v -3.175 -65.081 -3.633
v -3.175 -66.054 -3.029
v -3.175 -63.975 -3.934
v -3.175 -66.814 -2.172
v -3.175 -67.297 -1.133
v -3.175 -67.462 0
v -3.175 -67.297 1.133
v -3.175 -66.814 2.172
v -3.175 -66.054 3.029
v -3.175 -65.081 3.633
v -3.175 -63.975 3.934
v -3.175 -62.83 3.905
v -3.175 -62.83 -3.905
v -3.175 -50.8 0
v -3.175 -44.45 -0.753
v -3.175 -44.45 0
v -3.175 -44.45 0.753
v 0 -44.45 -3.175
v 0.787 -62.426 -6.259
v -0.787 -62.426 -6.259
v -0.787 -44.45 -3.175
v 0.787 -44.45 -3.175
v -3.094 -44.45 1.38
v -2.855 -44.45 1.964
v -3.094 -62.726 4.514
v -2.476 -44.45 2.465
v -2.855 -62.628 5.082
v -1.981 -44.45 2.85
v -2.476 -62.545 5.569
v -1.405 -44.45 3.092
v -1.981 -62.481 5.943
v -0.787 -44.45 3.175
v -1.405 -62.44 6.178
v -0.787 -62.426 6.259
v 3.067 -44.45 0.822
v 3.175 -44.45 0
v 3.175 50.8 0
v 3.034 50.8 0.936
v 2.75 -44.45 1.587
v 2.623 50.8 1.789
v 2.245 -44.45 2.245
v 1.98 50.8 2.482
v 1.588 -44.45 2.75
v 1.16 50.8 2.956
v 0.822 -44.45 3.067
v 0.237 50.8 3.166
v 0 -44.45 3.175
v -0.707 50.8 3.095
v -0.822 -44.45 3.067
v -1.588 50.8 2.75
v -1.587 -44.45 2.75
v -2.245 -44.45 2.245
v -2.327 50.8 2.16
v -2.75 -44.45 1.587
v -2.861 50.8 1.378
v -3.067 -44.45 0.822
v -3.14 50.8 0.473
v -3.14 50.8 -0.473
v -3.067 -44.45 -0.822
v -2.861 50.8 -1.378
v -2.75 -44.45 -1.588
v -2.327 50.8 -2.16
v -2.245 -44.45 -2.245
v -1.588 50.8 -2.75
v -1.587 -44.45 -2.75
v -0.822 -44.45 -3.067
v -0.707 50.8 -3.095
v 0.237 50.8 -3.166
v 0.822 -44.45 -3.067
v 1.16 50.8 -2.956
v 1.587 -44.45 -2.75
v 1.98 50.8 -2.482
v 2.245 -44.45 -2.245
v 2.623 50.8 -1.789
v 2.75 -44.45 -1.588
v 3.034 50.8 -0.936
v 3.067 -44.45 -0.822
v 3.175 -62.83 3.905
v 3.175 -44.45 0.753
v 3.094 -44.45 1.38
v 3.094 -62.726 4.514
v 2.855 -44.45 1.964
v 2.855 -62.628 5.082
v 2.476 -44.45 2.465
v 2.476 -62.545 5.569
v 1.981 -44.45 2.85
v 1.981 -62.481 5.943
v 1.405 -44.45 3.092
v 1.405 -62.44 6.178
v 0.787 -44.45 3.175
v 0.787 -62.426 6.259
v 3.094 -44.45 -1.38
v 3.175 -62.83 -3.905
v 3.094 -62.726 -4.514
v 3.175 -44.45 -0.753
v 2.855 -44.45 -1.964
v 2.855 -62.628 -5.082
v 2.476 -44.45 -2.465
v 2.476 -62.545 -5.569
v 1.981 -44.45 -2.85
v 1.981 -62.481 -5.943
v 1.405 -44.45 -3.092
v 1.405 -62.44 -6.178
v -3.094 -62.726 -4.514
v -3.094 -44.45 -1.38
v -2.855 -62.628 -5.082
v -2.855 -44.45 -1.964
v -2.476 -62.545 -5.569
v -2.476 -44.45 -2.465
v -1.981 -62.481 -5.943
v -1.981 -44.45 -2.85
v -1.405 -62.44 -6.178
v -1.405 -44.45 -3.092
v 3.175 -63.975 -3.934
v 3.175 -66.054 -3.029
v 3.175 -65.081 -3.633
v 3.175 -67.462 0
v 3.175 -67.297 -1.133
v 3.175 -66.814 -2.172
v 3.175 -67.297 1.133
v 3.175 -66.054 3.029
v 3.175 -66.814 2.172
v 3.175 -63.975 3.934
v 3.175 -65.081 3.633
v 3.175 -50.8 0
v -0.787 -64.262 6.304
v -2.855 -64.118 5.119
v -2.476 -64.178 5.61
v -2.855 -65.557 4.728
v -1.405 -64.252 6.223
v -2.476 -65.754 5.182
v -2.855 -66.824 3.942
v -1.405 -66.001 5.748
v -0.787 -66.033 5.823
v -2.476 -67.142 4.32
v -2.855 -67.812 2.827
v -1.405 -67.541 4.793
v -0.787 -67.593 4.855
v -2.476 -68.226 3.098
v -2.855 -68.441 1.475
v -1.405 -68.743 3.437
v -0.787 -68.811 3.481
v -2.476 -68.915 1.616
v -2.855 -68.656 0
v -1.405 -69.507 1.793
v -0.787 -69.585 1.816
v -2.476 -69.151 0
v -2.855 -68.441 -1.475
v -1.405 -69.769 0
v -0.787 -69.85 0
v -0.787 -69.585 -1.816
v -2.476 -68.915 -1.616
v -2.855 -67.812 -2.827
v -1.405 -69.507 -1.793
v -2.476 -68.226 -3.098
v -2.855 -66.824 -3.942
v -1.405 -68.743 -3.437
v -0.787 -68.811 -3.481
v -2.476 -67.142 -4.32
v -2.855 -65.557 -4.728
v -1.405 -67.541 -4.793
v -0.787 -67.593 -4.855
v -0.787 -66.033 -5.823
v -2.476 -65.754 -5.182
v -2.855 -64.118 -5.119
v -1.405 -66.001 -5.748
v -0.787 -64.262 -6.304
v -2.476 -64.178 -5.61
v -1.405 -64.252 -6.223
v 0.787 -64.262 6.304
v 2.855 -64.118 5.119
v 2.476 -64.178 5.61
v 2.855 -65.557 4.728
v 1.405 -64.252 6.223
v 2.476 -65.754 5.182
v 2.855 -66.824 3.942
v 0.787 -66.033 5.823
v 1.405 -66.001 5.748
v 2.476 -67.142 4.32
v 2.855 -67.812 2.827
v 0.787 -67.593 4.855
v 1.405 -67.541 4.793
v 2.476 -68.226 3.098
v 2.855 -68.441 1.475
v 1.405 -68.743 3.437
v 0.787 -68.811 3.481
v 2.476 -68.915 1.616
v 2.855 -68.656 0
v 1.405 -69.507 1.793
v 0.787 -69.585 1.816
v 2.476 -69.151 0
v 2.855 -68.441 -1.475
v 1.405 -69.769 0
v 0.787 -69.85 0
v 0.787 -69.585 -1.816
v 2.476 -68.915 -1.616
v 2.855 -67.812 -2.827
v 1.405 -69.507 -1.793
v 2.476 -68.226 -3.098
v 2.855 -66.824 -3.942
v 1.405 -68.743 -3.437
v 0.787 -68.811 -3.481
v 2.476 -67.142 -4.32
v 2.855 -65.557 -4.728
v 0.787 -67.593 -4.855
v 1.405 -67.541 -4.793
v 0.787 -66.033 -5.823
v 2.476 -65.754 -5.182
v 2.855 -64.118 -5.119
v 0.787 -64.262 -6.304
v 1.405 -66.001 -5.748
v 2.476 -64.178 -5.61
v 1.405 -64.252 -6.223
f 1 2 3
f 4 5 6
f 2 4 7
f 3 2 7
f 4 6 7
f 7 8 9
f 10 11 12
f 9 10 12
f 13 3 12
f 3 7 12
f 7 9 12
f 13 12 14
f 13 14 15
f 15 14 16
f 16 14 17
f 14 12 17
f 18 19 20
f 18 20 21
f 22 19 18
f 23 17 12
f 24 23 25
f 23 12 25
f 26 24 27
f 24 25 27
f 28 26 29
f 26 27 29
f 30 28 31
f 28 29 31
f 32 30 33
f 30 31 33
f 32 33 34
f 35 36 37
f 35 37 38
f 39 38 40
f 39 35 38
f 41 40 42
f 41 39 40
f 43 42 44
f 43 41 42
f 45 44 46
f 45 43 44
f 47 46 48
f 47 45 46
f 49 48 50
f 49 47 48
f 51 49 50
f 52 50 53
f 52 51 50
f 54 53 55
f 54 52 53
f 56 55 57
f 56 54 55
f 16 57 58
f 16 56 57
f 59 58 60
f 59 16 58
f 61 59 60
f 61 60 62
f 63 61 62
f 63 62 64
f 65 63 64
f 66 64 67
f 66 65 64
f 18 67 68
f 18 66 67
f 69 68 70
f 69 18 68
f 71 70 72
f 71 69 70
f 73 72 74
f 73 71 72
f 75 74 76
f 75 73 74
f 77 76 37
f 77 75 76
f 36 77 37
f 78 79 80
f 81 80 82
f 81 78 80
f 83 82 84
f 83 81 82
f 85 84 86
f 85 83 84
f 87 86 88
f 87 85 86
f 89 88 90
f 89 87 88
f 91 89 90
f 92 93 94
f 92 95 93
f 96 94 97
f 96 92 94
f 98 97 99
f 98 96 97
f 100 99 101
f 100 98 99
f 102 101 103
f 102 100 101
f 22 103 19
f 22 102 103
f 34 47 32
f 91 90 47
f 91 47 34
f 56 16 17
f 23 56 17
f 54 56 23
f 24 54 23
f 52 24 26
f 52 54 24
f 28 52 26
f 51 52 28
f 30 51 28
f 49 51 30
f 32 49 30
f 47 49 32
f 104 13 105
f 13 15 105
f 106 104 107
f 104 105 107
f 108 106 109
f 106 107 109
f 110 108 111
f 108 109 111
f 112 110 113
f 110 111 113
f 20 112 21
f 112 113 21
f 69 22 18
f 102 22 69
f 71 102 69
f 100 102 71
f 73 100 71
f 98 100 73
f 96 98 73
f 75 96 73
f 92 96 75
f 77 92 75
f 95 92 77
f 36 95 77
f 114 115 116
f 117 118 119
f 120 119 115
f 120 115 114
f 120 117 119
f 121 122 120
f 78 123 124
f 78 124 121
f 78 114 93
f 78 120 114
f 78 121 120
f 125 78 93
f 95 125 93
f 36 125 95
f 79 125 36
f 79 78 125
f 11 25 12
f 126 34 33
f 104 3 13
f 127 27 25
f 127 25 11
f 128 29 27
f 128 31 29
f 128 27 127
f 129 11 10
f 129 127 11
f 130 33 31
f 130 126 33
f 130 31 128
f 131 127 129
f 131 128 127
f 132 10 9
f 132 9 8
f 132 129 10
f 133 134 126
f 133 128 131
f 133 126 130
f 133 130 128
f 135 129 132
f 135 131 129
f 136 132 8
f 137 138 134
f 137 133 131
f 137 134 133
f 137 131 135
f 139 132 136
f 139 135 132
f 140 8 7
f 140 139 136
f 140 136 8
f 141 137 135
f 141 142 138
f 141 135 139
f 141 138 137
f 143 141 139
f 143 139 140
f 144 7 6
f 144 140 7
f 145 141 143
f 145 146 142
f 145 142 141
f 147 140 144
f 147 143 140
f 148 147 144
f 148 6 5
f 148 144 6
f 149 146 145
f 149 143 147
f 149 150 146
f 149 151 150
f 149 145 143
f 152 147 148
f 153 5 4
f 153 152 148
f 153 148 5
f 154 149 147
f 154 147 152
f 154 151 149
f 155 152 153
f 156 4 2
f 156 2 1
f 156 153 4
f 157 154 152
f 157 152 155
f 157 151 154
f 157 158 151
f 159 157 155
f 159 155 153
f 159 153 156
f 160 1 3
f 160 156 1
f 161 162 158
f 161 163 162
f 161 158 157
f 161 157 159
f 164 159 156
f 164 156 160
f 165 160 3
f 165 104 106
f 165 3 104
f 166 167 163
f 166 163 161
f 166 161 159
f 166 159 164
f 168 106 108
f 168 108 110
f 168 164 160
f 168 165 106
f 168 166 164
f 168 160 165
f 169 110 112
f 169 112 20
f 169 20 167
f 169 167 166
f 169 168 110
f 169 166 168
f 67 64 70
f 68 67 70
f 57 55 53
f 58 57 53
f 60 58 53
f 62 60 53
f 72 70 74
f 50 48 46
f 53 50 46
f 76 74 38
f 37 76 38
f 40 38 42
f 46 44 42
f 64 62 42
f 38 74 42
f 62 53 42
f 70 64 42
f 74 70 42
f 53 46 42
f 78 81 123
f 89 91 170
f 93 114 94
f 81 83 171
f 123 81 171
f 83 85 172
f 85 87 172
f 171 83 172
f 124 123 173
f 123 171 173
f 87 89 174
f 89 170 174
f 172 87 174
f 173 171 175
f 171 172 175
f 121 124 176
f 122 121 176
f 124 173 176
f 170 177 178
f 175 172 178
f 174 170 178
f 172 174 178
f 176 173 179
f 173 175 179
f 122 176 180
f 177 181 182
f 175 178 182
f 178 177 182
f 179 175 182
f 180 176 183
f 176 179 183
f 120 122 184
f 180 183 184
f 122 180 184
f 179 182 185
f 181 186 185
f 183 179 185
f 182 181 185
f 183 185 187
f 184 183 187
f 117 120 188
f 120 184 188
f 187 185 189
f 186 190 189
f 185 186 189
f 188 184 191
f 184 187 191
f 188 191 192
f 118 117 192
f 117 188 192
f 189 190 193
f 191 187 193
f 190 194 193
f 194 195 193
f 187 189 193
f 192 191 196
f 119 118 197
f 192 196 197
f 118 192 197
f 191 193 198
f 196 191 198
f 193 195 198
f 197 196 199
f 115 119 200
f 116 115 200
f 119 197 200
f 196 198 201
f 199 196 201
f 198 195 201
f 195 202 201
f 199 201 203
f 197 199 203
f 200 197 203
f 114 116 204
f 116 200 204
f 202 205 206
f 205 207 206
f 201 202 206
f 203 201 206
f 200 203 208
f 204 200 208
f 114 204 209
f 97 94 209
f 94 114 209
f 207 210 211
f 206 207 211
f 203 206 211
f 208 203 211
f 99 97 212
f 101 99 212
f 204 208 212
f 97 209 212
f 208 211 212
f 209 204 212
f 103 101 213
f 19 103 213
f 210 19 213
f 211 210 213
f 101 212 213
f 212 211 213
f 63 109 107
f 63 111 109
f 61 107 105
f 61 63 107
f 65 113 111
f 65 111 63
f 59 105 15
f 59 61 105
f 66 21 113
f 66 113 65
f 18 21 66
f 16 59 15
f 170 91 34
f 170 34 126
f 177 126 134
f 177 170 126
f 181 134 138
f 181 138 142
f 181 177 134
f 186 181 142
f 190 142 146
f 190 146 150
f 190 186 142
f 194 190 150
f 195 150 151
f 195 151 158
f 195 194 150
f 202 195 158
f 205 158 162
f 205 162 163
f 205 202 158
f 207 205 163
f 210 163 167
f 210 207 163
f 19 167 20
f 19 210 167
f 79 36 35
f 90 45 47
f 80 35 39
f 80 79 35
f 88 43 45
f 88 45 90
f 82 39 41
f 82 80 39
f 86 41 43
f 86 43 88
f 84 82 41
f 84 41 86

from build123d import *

# Parameters (mm, degrees)
F0_R     = 3.175
F1_DEPTH = 50.8
F3_DEPTH = 3.175
F4_R     = 2.3876


with BuildPart() as f1:
    # F0 (on Front) → F1 (new body, symmetric)
    with BuildSketch(Plane.XZ):
        Circle(F0_R)
    extrude(amount=F1_DEPTH, both=True)

    # F2 (on Right) → F3 (join, symmetric)
    with BuildSketch(Plane.YZ):
        with BuildLine():
            Line((-44.45, -3.175), (-44.45, 3.175))
            Line((-44.45, 3.175), (-62.426432, 6.25859))
            ThreePointArc((-62.426432, 6.25859), (-69.85, 0), (-62.426432, -6.25859))
            Line((-62.426432, -6.25859), (-44.45, -3.175))
        make_face()
    extrude(amount=F3_DEPTH, both=True)

    # F4
    f4_edges = [f1.edges().sort_by_distance(p)[0] for p in [
        (3.175, -69.85, 0),
        (-3.175, -69.85, 0),
    ]]
    fillet(f4_edges, radius=F4_R)


solid = f1.part
